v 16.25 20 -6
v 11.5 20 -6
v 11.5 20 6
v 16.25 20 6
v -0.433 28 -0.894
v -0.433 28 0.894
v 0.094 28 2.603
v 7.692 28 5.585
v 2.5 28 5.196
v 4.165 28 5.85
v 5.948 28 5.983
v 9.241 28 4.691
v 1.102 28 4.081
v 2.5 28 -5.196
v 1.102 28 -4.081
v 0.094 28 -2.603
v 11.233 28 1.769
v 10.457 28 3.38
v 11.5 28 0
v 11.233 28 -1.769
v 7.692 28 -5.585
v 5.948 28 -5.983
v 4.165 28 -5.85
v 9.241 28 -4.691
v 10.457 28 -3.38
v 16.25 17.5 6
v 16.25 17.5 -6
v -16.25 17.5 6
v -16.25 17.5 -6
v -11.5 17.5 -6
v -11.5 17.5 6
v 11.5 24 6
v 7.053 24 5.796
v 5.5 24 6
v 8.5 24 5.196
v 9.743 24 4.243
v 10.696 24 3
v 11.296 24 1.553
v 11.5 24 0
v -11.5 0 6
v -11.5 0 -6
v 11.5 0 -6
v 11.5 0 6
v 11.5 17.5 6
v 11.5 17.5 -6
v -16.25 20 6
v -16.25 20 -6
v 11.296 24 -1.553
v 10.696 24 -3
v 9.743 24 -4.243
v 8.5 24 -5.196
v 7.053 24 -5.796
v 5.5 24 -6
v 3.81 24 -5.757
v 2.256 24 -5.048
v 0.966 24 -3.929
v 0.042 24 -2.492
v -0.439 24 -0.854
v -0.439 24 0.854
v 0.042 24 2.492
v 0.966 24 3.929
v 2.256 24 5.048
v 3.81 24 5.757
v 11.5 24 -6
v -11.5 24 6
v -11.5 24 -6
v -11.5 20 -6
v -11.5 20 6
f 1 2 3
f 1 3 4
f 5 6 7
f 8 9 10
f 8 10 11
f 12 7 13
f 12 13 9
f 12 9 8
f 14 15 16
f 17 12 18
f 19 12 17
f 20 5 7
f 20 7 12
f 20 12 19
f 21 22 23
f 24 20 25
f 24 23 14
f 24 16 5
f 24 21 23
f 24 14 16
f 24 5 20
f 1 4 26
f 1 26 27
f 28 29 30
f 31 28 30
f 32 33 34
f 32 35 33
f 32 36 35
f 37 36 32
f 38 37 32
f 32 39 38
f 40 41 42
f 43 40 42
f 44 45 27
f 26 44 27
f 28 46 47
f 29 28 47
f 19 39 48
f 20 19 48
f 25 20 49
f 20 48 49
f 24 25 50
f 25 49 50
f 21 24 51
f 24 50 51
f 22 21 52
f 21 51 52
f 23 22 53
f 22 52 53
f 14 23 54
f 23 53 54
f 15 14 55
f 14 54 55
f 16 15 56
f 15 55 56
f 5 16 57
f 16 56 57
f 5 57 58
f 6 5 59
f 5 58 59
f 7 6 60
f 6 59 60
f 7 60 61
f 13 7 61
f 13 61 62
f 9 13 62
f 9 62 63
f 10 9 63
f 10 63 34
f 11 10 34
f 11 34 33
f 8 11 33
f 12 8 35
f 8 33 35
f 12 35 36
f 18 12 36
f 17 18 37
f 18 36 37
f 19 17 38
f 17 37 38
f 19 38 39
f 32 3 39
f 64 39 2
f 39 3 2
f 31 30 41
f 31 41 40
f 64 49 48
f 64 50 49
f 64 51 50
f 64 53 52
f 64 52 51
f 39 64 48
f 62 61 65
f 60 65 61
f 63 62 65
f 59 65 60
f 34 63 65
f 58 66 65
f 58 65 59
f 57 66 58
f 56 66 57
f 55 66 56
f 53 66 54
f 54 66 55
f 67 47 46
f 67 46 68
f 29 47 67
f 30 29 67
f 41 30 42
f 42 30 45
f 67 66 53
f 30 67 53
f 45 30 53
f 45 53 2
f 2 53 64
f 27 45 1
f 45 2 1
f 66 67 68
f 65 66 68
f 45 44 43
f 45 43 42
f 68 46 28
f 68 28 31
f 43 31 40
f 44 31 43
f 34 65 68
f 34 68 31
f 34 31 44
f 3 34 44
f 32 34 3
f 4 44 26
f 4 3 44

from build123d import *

# Parameters (mm, degrees)
SKETCH1_R           = 6
BOSS_EXTRUDE1_DEPTH = 24
BOSS_EXTRUDE2_START = 24
SKETCH1_3_R         = 6
BOSS_EXTRUDE2_DEPTH = 4
BOSS_EXTRUDE3_START = 20
SKETCH1_4_W         = 32.5
SKETCH1_4_H         = 12
BOSS_EXTRUDE3_DEPTH = 2.5


with BuildPart() as part:
    # Sketch1 → Boss-Extrude1 (new body)
    with BuildSketch(Plane(origin=(0, 0, 0), x_dir=(1, 0, 0), z_dir=(0, 1, 0))):
        with BuildLine():
            Line((-11.5, 6), (-11.5, -6))
            Line((-11.5, -6), (5.5, -6))
            ThreePointArc((5.5, -6), (-0.5, -3e-09), (5.499999994, 6))
            Line((5.499999994, 6), (-11.5, 6))
        make_face()
        with Locations((5.5, 0)):
            Circle(SKETCH1_R)
        with BuildLine():
            Line((11.5, 6), (5.499999994, 6))
            ThreePointArc((5.499999994, 6), (9.742640685, 4.242640689), (11.5, 0))
            Line((11.5, 0), (11.5, 6))
        make_face()
        with BuildLine():
            ThreePointArc((11.5, 0), (9.742640687, -4.242640687), (5.5, -6))
            Line((5.5, -6), (11.5, -6))
            Line((11.5, -6), (11.5, 0))
        make_face()
    extrude(amount=BOSS_EXTRUDE1_DEPTH)

    # Sketch1<3> → Boss-Extrude2 (add)
    with BuildSketch(Plane(origin=(0, 0, 0), x_dir=(1, 0, 0), z_dir=(0, 1, 0)).offset(BOSS_EXTRUDE2_START)):
        with Locations((5.5, 0)):
            Circle(SKETCH1_3_R)
    extrude(amount=BOSS_EXTRUDE2_DEPTH)

    # Sketch1<4> → Boss-Extrude3 (add)
    with BuildSketch(Plane(origin=(0, 0, 0), x_dir=(1, 0, 0), z_dir=(0, 1, 0)).offset(BOSS_EXTRUDE3_START)):
        Rectangle(SKETCH1_4_W, SKETCH1_4_H)
    extrude(amount=-BOSS_EXTRUDE3_DEPTH)


solid = part.part
